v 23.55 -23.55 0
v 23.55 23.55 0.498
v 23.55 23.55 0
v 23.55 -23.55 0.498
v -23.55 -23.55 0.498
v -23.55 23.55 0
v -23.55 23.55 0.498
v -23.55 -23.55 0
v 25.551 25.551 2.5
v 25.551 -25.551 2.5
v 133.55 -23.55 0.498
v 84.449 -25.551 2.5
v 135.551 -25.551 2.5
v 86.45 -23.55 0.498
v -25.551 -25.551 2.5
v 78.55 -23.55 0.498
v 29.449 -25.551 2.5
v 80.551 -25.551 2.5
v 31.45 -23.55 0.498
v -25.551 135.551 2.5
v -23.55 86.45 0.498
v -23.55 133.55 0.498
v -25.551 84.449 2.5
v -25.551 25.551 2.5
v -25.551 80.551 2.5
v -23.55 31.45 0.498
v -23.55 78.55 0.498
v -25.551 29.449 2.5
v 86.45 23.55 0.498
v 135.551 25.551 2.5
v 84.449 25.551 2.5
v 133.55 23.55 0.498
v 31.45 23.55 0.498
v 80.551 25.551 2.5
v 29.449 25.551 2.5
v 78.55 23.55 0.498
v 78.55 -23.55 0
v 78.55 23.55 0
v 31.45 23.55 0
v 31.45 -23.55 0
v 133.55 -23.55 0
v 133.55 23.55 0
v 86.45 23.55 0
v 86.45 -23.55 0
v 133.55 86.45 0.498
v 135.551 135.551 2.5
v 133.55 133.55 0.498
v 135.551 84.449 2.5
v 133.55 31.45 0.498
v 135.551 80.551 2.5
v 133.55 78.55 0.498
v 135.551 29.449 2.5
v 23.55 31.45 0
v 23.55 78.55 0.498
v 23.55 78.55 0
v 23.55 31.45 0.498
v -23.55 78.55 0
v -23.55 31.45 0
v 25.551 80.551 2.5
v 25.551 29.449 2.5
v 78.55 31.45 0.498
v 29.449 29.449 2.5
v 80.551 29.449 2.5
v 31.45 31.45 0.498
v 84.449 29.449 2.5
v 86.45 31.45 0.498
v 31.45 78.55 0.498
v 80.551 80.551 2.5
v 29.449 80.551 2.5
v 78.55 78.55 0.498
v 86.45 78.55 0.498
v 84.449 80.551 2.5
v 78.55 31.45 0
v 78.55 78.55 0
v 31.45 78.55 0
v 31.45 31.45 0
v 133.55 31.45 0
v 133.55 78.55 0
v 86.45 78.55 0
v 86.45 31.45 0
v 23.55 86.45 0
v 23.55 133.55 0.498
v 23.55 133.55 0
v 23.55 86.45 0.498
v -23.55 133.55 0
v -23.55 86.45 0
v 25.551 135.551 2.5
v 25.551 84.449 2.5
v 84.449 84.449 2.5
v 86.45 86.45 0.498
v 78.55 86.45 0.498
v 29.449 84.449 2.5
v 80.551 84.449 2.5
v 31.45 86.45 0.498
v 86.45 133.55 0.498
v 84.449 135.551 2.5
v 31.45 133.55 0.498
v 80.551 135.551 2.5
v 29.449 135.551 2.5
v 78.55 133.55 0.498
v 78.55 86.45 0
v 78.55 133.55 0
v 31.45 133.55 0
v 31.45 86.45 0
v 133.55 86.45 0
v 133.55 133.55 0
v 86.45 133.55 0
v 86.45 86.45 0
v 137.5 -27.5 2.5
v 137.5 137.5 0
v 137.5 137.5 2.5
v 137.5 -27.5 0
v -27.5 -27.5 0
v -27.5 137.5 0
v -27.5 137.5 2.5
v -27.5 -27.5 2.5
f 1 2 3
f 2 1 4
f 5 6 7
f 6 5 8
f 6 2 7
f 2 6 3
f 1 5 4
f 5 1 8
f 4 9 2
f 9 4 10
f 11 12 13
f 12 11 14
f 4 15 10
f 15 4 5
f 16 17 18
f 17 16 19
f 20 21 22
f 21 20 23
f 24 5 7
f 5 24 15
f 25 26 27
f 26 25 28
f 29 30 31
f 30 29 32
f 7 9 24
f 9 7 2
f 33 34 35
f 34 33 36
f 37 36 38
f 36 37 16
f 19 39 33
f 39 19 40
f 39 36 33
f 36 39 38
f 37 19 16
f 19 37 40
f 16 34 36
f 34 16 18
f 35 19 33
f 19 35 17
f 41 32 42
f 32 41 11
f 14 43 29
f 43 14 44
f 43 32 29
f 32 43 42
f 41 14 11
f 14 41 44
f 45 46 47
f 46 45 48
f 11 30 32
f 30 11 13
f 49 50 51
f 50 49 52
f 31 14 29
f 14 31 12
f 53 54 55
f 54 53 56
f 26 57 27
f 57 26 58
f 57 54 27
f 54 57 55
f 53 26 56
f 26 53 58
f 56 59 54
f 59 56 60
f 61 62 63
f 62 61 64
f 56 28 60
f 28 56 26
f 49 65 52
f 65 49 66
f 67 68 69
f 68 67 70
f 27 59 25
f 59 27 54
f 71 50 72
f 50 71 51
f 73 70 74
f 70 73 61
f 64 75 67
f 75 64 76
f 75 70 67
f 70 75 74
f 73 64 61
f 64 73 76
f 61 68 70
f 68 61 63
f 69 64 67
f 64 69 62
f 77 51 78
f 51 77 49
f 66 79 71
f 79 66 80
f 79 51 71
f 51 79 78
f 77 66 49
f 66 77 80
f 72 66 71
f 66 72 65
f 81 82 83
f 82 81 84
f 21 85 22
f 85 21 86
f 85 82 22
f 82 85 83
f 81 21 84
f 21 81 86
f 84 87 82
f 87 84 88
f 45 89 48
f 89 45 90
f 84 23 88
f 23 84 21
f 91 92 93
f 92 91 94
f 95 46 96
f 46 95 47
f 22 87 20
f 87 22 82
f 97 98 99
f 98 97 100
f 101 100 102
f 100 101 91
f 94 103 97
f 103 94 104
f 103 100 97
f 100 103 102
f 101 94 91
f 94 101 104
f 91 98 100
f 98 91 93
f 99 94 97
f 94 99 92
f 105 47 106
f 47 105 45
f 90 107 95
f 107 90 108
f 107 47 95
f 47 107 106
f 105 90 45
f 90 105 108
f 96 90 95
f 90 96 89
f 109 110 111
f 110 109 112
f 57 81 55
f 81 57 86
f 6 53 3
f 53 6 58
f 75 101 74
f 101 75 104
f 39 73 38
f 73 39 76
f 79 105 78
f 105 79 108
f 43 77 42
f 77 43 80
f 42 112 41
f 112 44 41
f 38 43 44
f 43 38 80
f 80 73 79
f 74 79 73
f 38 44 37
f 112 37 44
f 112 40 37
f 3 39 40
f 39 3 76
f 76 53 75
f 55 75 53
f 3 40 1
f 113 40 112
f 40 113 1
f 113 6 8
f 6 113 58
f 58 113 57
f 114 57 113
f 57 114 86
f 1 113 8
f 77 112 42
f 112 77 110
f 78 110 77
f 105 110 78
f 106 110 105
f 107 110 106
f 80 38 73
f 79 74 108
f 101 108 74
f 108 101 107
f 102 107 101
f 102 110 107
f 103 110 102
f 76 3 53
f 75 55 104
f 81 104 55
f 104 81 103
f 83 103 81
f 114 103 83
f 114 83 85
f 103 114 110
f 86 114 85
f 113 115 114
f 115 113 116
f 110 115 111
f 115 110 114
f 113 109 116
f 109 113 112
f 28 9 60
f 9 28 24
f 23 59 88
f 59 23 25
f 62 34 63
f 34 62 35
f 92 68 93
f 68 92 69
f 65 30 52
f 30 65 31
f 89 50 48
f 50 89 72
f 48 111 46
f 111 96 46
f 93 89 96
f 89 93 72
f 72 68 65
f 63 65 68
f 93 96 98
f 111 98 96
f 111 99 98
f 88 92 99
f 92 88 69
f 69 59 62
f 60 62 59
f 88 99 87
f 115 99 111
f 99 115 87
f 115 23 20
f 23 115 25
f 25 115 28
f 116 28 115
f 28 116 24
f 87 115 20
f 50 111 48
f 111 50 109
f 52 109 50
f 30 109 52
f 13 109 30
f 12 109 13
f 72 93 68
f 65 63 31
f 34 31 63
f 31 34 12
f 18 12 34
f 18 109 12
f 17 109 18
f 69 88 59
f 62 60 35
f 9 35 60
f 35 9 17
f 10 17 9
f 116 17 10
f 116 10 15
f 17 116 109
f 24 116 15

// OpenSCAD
// file: ../assorter.scad
// Variables

e=0.001;

x = 2;
y = 3;

//box();
//grid();
//slice();
//stack();

function middle(times) = -length_default/2 +(length_default+(times-1)*pitch_default)/2 ;
left   = -length_default/2 ;
front  = -length_default/2 ;
right  =  length_default/2+(x-1)*pitch_default ;
back   =  length_default/2+(y-1)*pitch_default ;
bottom =  0;
top    =  height_default;


grid_height = lift_default + triangle_height_default - cut_default ;

module body_form(
A,B,K,L,height
){
    polyhedron(
        points = [
            [-A,-B, 0],  // 0
            [ A,-B, 0],   // 1
            [ A, B, 0],  // 2
            [-A, B, 0], // 3
            [-K,-L, height],  // 0
            [ K,-L, height],   // 1
            [ K, L, height],  // 2
            [-K, L, height]], // 3
        faces = [
            [0,1,2,3],  // bottom
            [4,5,1,0],  // front
            [7,6,5,4],  // top
            [5,6,2,1],  // right
            [6,7,3,2],  // back
            [7,4,0,3]] // left
        );
}

module box_bottom(
  lift = lift_default,
  length = length_default,
  height = height_default ,
  triangle_height = triangle_height_default,
  bottom = true, // if the bottom should be added or not... (the inner one should not have it)
){

    // größere
    K = length/2 ;
    L = K;
    // kleinere
    A = (length-2*triangle_height)/2;
    B = A;
    remaining_height = height - lift - triangle_height;
    if (bottom) {
    translate([0,0,(lift+1)/2])
        cube([2*A,2*B,lift+1],center=true);
    }
    translate([0,0,lift-e])
    // creates an inverted cut pyramid
    body_form(A,B,K,L,triangle_height+e);

}

module solid_box(
  x = x,
  y = y,
  lift = lift_default,
  length = length_default,
  height = height_default ,
  triangle_height = triangle_height_default,
  pitch = pitch_default,
  bottom = true,
  cut_sides = true,
  fill_pyramid_tip = false,
){
    difference(){
    union(){
        remaining_height = height - lift - triangle_height;
        for (m = [0:y-1]){
            for (n = [0:x-1])
                translate([n*pitch,m*pitch,0])
                    box_bottom(length=length,bottom=bottom);
        }
        translate([-length/2,-length/2,lift + triangle_height-e])
            cube([(x-1)*pitch+length,(y-1)*pitch +length,remaining_height]);

        if (fill_pyramid_tip){
            // fill the gaps inside the pyramids *shrug*
            translate([-length/2,-length/2,triangle_height+0.1])
                cube([(x-1)*pitch+length,(y-1)*pitch +length,1]);
        }
    }
    if (cut_sides) {
        // cut left side of box
        translate([-length/2,-length/2-2,0])
            cut_object(length = (y-1)*pitch +length +4 );

        // cut right side of box
        translate([(x-1)*pitch+length/2,-length/2-2,0])
        mirror(v=[1,0,0])
            cut_object(length = (y-1)*pitch +length +4 );

        // cut front side of box
        //translate([(x-1)*pitch+length/2,-length/2-2,0])
        translate([-length/2-2,-length/2,0])
        rotate([0,0,-90])
        mirror(v=[1,0,0])
            cut_object(length = (x-1)*pitch +length +4 );

        // cut back side of box
        translate([-length/2-2,length/2+(y-1)*pitch,0])
        rotate([0,0,-90])
            cut_object(length = (x-1)*pitch +length +4 );
        }
    }

}

module box(handle_enable = true){
    difference(){
        solid_box(fill_pyramid_tip=true);
        // inner solid box without the cubed lift on the bottom.. now the wall thickness looks quite okay
        // we have to lower the innter box about lift_default distance again
        translate([0,0,wall_thickness_default- lift_default])
            solid_box(length = length_default - 2* wall_thickness_default,bottom=false);
    }
    if (handle_enable) {
        // add handle
        translate([
            middle(x),
            -length_default/2+wall_thickness_default,
            height_default-handle_top_distance
        ])
            handle();
    }
}

module grid(
  x = x,
  y = y,
  lift = lift_default,
  length = length_default,
  height = height_default ,
  triangle_height = triangle_height_default,
  pitch = pitch_default
){
    difference(){
    // main body
        union(){
            difference(){
                translate([-length/2,-length/2,0])
                cube([(x-1)*pitch+length,(y-1)*pitch +length,lift+triangle_height]);

                translate([0,0,-e])
                    solid_box(length= length_default + 0.1, cut_sides = false );     // do we need some added clearence here?
            }
        }

    translate([-length/2-1,-length/2-1,lift + triangle_height - cut_default])
        cube([(x-1)*pitch+length+2,(y-1)*pitch +length + 2,2]);
    }
}


module cut_object(
    length = length_default,
    height = height_default,
    diff_bottom = diff_bottom_default,

){
    rotate([-90,0,0])
    linear_extrude(height=length)

        polygon(
            [   [-e,0],
                [-e,-height],
                [0,-height],
                [diff_bottom,0]
            ]
            );
}

module slice() {
    difference(){
        box();
        translate([-length_default/2-10,-length_default/2-10,-5])
        cube([
            1/2*(length_default+(x-1)*pitch_default + 20),
            length_default+(y-1)*pitch_default +20,
            height_default+10]);
    }
}

module handle(){
    r = 2;
    $fa = 1;
    $fs = 0.4;

    rotate([0,180,0])
    hull(){
        hull(){
            //left corner
            translate([-handle_width/2,0,0])
                cube([1,1,handle_top_height ]);

            // right corner
            translate([handle_width/2,0,0])
            translate([-1,0,0])
                cube([1,1,handle_top_height ]);

            // left round corner
            translate([-handle_width/2,handle_depth])
            translate([r,-r,0])
            cylinder(r=r,h=handle_top_height);

            // right round corner
            translate([handle_width/2,handle_depth])
            translate([-r,-r,0])
            cylinder(r=r,h=handle_top_height );
        }

        // hull anchor
        height = handle_depth / tan(handle_angle);

        translate([-handle_width/2,0,0])
            cube([handle_width,0.1,height]);
    }
}

module stack(){
    // module to preview a stacked box
    slice();
    translate([0,0,height_default-handle_top_distance ])
    slice();
}
// file: defaults.scad
//default variables for this project

//Normal
length_default = 55;
pitch_default = 55 ;

height_default = 75;

triangle_height_default = 4 ;
triangle_width_default  = 2 * triangle_height_default;
cut_default=2;
lift_default=0.5;

wall_thickness_default = 1.2;

handle_width = 30;
handle_depth = 10;

handle_top_height = 1;
handle_angle = 45; // degree
handle_top_distance = 5;

diff_bottom_default = 0.5;
// main file
// boxes ;-D

include <defaults.scad>
include <../assorter.scad>

x = 3;
y = 3;

grid();
